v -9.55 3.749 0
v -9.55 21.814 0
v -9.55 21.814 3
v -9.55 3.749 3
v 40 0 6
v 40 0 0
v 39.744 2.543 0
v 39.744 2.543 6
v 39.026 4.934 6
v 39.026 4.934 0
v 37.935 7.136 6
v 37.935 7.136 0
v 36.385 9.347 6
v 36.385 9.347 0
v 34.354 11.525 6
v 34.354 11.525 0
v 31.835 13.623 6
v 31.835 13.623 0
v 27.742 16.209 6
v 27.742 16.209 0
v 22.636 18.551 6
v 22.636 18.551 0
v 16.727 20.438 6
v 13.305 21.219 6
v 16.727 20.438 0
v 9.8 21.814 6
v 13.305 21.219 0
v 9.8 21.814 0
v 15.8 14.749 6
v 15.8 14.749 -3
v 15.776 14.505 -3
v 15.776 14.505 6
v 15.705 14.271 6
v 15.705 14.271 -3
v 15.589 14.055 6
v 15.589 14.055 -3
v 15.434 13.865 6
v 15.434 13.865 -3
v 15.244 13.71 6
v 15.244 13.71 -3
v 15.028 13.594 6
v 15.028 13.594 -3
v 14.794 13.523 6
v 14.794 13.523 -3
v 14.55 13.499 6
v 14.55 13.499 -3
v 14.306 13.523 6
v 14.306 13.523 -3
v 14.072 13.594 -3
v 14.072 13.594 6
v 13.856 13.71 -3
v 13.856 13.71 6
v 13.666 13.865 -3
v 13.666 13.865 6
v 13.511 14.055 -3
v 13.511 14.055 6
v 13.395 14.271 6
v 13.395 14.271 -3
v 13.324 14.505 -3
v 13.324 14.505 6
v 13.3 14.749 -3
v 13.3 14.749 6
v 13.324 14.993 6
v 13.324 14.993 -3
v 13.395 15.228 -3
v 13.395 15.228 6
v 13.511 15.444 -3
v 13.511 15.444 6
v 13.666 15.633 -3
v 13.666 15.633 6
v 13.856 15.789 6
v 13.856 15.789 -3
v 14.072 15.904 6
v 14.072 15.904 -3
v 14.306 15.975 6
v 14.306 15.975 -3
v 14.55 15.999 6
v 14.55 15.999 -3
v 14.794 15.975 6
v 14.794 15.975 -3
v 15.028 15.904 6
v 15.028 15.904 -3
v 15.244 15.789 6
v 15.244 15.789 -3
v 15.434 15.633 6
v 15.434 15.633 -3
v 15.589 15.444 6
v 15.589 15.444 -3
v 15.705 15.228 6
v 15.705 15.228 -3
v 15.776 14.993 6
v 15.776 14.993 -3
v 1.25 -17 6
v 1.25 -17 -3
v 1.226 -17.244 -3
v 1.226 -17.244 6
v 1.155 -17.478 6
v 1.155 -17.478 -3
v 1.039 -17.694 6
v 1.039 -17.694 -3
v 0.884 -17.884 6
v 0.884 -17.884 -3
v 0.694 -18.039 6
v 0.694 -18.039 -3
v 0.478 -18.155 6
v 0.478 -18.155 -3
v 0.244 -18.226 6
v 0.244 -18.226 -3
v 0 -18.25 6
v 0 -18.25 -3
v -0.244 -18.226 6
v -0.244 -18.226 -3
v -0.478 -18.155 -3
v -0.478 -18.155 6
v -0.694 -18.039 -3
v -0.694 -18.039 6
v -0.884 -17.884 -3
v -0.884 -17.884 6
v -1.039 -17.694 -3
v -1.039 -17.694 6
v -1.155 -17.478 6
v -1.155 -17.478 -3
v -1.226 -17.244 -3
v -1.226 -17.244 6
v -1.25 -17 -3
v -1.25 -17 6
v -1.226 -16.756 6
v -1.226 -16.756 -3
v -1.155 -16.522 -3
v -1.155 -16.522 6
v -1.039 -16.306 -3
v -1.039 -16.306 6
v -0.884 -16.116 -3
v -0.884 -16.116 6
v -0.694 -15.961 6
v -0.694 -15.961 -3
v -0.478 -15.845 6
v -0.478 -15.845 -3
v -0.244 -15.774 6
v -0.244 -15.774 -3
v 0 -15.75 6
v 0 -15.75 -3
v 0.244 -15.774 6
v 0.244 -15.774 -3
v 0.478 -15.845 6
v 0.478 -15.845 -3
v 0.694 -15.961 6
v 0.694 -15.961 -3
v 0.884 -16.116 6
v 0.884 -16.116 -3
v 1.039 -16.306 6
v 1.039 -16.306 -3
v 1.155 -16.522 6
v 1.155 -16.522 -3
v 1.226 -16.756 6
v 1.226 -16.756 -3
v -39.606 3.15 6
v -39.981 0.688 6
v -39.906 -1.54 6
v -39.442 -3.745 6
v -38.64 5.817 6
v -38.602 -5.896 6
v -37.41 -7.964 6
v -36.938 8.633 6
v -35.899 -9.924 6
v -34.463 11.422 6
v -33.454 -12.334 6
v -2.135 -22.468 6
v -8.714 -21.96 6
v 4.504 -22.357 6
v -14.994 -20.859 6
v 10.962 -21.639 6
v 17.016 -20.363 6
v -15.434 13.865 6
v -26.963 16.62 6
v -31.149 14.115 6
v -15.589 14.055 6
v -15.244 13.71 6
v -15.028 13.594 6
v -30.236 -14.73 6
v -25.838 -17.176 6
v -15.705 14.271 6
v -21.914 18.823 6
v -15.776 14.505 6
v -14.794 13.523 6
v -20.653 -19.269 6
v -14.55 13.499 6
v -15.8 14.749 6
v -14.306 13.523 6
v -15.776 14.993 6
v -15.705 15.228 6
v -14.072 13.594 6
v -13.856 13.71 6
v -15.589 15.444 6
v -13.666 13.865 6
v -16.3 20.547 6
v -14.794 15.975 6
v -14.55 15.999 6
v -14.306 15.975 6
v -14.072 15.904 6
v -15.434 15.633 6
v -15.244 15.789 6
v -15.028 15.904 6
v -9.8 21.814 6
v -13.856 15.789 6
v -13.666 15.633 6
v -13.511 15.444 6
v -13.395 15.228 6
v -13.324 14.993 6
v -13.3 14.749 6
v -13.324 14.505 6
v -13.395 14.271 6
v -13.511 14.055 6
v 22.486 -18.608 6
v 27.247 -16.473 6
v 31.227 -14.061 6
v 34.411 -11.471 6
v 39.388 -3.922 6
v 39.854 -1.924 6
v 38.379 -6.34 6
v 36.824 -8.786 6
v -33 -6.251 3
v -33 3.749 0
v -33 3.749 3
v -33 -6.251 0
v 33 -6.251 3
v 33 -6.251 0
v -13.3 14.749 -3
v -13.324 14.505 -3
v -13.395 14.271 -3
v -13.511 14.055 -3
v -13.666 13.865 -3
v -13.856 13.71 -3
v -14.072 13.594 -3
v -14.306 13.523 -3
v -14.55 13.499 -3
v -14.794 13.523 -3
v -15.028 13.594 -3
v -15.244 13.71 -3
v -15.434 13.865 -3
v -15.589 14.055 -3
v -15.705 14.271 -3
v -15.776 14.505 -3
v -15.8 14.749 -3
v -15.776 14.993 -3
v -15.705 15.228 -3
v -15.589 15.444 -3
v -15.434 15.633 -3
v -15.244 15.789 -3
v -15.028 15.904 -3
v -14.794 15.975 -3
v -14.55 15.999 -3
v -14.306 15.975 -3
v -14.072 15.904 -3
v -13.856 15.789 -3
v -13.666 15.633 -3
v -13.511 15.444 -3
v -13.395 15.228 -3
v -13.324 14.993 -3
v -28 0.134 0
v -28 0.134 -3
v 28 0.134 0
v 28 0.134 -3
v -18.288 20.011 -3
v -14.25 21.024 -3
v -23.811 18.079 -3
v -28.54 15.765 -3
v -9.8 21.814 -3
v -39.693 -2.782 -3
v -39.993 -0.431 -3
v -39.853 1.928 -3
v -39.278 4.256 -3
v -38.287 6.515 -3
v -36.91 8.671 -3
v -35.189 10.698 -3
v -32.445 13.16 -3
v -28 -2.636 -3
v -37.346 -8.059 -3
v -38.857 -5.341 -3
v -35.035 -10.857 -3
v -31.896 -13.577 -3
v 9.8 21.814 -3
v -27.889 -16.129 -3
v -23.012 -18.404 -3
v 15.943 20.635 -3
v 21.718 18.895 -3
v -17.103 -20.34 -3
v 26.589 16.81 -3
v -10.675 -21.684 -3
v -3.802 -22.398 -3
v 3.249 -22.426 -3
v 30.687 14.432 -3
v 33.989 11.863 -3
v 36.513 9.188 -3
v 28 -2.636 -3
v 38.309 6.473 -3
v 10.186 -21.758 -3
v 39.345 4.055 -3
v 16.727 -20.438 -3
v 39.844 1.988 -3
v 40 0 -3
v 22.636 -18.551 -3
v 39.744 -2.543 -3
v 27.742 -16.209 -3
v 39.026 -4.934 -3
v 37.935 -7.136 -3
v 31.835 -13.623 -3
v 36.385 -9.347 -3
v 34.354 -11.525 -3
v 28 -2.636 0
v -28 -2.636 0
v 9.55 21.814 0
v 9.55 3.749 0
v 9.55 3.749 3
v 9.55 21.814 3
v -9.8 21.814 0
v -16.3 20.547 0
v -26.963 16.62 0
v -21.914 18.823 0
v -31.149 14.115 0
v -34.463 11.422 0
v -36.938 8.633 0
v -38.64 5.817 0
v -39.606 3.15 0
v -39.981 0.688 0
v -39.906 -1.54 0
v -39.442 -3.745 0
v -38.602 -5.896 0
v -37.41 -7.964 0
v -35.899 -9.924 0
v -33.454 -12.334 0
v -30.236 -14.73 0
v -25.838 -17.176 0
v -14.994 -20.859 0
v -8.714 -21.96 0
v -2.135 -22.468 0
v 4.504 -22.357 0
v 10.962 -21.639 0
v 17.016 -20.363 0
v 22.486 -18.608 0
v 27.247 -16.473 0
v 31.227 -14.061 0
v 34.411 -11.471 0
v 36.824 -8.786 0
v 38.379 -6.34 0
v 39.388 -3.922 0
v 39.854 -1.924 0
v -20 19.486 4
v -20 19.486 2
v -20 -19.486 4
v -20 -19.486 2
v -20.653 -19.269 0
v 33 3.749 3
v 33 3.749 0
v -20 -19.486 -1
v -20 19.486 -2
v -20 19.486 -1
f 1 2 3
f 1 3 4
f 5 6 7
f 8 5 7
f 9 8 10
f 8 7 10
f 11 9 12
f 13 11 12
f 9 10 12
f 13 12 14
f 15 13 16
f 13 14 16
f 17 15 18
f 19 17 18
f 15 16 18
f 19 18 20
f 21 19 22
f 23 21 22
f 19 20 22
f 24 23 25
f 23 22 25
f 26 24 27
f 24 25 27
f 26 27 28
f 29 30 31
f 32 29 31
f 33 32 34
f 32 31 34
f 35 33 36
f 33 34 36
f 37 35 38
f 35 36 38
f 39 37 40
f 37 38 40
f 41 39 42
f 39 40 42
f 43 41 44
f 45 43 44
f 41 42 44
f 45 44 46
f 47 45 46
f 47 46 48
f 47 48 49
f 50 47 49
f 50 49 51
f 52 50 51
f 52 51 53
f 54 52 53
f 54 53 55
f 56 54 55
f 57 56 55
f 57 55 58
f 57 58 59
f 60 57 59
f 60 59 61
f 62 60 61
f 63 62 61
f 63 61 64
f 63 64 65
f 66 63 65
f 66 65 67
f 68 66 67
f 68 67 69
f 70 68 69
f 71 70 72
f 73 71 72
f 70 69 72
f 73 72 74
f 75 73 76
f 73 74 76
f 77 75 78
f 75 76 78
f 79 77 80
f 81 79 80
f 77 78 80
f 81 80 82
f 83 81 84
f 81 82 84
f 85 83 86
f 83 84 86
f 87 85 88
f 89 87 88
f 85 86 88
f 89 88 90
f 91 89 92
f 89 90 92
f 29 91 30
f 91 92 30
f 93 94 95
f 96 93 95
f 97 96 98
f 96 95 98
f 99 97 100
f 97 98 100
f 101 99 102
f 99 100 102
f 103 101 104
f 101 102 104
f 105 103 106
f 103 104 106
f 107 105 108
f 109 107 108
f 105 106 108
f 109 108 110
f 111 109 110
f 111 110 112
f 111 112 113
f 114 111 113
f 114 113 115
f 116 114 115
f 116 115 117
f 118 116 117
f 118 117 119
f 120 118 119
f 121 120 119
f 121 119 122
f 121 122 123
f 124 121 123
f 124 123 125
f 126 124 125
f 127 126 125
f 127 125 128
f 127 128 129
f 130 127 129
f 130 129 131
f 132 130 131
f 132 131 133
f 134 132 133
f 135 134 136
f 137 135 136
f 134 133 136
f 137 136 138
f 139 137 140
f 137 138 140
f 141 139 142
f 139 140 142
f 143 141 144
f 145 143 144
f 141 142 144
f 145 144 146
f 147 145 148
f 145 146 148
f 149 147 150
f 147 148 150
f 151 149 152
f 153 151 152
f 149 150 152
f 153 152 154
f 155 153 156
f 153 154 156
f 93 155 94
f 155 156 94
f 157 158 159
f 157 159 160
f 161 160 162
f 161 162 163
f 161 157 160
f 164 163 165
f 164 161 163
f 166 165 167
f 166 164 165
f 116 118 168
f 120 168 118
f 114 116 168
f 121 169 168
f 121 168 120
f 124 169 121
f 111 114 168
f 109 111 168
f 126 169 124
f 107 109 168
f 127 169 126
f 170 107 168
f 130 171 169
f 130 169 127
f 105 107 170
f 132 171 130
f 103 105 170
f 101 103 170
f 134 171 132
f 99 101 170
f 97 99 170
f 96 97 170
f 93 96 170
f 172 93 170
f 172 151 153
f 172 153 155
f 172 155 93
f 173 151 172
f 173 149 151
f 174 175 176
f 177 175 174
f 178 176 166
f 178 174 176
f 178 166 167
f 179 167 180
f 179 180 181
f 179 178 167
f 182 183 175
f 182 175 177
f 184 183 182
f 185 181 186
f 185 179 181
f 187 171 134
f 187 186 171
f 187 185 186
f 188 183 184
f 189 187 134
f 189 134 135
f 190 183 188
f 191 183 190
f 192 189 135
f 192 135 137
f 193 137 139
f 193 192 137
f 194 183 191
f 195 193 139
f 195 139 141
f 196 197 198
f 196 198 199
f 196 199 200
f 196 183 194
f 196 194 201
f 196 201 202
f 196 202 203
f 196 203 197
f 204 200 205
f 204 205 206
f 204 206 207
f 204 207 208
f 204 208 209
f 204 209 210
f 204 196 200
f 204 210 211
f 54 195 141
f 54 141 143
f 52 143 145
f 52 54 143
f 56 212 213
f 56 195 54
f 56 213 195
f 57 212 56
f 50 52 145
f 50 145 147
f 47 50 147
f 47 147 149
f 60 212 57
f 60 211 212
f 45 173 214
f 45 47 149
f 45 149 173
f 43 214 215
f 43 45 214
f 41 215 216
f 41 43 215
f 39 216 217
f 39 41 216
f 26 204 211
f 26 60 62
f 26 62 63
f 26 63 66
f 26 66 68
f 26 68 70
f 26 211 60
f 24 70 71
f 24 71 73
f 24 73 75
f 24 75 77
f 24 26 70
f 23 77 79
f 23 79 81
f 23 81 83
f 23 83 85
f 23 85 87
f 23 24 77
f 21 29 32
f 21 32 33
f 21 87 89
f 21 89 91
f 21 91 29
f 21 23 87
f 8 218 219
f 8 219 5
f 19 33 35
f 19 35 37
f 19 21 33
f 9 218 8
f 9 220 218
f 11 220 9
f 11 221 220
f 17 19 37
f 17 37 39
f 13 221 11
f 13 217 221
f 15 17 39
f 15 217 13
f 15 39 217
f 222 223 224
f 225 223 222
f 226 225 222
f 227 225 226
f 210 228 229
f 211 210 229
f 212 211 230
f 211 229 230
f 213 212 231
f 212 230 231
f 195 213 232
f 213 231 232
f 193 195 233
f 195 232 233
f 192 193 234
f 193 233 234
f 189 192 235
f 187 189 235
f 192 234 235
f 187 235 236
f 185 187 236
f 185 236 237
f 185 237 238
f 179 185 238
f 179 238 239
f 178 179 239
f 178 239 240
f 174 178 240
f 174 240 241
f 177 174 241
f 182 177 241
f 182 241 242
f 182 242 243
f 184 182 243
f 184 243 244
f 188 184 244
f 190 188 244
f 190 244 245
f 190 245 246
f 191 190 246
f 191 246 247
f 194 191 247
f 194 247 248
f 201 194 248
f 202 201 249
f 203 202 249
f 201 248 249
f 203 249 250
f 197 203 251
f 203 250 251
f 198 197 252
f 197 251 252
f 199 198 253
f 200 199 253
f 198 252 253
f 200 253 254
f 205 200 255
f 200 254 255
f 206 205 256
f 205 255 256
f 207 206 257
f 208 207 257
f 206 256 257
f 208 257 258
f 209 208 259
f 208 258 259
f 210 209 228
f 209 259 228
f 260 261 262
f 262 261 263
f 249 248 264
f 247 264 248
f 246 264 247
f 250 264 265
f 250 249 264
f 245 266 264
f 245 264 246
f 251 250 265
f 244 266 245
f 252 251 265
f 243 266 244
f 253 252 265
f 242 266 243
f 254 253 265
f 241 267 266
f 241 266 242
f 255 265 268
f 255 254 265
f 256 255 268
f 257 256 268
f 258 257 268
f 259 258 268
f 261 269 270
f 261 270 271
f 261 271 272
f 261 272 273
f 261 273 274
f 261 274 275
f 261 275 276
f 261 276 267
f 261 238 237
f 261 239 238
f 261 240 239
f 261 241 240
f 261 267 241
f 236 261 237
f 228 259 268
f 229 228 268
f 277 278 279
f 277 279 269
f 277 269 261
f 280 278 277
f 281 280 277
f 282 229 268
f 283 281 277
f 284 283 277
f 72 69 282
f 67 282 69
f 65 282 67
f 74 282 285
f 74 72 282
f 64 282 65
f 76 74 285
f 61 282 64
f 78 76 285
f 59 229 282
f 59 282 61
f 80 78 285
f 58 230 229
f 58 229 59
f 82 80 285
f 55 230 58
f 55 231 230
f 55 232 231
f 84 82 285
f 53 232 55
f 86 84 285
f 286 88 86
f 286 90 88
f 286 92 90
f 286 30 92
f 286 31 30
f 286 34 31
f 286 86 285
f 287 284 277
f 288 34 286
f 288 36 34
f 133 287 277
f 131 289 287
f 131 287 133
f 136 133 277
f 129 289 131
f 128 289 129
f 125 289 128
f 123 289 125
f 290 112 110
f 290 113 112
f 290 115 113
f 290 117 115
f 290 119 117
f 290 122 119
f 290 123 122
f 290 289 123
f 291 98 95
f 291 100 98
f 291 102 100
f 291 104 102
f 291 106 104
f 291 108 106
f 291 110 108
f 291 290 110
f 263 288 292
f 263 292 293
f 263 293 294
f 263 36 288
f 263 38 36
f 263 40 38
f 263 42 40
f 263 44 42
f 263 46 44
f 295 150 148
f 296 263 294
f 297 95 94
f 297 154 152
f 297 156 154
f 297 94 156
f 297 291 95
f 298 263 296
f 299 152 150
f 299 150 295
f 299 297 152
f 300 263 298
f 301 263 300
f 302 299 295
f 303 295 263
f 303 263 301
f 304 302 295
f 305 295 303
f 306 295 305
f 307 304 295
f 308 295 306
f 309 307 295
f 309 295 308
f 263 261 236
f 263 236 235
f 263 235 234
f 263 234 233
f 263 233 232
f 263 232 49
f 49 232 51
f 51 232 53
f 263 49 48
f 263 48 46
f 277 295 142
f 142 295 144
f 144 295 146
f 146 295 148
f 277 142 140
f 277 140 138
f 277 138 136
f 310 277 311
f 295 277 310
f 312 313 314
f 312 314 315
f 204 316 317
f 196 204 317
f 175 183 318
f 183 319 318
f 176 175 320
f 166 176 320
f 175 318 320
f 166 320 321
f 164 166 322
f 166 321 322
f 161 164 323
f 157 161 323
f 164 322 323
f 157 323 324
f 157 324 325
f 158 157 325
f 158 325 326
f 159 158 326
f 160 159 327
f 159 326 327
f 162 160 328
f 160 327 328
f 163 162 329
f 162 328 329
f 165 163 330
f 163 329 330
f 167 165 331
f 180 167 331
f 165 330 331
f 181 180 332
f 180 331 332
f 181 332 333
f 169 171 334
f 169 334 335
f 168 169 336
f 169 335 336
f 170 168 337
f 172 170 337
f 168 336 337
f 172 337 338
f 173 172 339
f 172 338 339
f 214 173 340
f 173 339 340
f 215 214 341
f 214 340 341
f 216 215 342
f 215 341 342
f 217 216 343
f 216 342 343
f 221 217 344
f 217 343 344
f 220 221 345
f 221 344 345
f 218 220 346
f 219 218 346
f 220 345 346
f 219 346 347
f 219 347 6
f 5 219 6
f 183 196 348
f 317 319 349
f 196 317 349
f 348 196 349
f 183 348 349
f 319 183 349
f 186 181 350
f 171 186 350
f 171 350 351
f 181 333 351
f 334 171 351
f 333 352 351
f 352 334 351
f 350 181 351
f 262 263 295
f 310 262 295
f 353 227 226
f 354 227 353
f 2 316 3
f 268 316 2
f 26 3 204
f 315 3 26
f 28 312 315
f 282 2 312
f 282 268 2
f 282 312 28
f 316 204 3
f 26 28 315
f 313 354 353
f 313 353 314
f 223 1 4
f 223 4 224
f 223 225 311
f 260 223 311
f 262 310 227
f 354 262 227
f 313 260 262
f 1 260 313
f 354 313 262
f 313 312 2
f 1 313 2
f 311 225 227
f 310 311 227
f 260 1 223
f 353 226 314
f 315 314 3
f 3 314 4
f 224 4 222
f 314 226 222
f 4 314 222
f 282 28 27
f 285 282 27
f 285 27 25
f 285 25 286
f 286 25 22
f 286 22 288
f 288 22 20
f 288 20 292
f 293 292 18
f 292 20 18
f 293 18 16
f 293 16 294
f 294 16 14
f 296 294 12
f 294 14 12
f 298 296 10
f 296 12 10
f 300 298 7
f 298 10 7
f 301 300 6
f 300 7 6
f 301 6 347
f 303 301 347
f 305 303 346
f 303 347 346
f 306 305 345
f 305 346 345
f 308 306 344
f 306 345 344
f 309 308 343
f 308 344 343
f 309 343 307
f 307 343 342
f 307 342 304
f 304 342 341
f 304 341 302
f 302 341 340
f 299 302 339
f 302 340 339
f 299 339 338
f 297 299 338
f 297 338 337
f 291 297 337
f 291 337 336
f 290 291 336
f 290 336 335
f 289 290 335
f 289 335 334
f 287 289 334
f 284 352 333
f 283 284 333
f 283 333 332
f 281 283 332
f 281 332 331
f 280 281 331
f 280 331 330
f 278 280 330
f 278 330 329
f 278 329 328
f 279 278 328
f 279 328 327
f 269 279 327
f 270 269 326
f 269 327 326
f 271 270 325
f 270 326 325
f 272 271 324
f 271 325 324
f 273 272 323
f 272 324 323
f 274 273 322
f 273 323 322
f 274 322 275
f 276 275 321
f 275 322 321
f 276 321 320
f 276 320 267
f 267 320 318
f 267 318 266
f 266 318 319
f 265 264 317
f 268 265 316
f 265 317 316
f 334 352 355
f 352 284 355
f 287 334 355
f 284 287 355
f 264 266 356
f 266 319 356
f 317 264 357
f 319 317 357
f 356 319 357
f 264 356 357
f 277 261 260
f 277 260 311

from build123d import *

# Parameters (mm, degrees)
PAD_DEPTH       = 6
POCKET_DEPTH    = 3
PAD001_DEPTH    = 3
SKETCH003_W     = 56
SKETCH003_H     = 2.77
POCKET001_DEPTH = 3
SKETCH004_W     = 19.6
SKETCH004_H     = 1
POCKET002_DEPTH = 9.001
SKETCH005_R     = 1.25
POCKET003_DEPTH = 9.001


with BuildPart() as part:
    # Sketch → Pad (new body)
    with BuildSketch(Plane.XY):
        with BuildLine():
            add(Edge.make_bspline(
                [(40, 0), (40, 38.971143), (-20, 19.485572), (-80, 0), (-20, -19.485572), (40, -38.971143), (40, 0)],
                knots=[0, 0, 0, 2.094395, 2.094395, 4.18879, 4.18879, 6.283185, 6.283185, 6.283185], degree=2, weights=[1, 0.5, 1, 0.5, 1, 0.5, 1]))
        make_face()
    extrude(amount=PAD_DEPTH)

    # Sketch001 (on Face2 of Pad) → Pocket (cut)
    with BuildSketch(Plane(origin=(0, 0, 0), x_dir=(1, 0, 0), z_dir=(0, 0, -1))):
        Polygon((9.55, -3.749324), (9.55, -21.849324), (-9.55, -21.849324), (-9.55, -3.749324), (-33, -3.749324), (-33, 6.250676), (33, 6.250676), (33, -3.749324), align=None)
    extrude(amount=-POCKET_DEPTH, mode=Mode.SUBTRACT)

    # Sketch002 (on Face2 of Pocket) → Pad001 (join)
    with BuildSketch(Plane(origin=(0, 0, 0), x_dir=(1, 0, 0), z_dir=(0, 0, -1))):
        with BuildLine():
            add(Edge.make_bspline(
                [(40, 0), (40, 38.971143), (-20, 19.485572), (-80, 0), (-20, -19.485572), (40, -38.971143), (40, 0)],
                knots=[0, 0, 0, 2.094395, 2.094395, 4.18879, 4.18879, 6.283185, 6.283185, 6.283185], degree=2, weights=[1, 0.5, 1, 0.5, 1, 0.5, 1]))
        make_face()
    extrude(amount=PAD001_DEPTH)

    # Sketch003 (on Face4 of Pad001) → Pocket001 (cut)
    with BuildSketch(Plane(origin=(0, 0, -3), x_dir=(1, 0, 0), z_dir=(0, 0, -1))):
        with Locations((0, 1.250676)):
            Rectangle(SKETCH003_W, SKETCH003_H)
    extrude(amount=-POCKET001_DEPTH, mode=Mode.SUBTRACT)

    # Sketch004 (on Face4 of Pocket001) → Pocket002 (cut, through all)
    with BuildSketch(Plane(origin=(0, 0, -3), x_dir=(1, 0, 0), z_dir=(0, 0, -1))):
        with Locations((0, -22.314269)):
            Rectangle(SKETCH004_W, SKETCH004_H)
    extrude(amount=-POCKET002_DEPTH, mode=Mode.SUBTRACT)

    # Sketch005 (on Face7 of Pocket002) → Pocket003 (cut, through all)
    with BuildSketch(Plane(origin=(0, 0, -3), x_dir=(1, 0, 0), z_dir=(0, 0, -1))):
        with Locations((-14.55, -14.749324)):
            Circle(SKETCH005_R)
        with Locations((0, 17)):
            Circle(SKETCH005_R)
        with Locations((14.55, -14.749324)):
            Circle(SKETCH005_R)
    extrude(amount=-POCKET003_DEPTH, mode=Mode.SUBTRACT)


solid = part.part
